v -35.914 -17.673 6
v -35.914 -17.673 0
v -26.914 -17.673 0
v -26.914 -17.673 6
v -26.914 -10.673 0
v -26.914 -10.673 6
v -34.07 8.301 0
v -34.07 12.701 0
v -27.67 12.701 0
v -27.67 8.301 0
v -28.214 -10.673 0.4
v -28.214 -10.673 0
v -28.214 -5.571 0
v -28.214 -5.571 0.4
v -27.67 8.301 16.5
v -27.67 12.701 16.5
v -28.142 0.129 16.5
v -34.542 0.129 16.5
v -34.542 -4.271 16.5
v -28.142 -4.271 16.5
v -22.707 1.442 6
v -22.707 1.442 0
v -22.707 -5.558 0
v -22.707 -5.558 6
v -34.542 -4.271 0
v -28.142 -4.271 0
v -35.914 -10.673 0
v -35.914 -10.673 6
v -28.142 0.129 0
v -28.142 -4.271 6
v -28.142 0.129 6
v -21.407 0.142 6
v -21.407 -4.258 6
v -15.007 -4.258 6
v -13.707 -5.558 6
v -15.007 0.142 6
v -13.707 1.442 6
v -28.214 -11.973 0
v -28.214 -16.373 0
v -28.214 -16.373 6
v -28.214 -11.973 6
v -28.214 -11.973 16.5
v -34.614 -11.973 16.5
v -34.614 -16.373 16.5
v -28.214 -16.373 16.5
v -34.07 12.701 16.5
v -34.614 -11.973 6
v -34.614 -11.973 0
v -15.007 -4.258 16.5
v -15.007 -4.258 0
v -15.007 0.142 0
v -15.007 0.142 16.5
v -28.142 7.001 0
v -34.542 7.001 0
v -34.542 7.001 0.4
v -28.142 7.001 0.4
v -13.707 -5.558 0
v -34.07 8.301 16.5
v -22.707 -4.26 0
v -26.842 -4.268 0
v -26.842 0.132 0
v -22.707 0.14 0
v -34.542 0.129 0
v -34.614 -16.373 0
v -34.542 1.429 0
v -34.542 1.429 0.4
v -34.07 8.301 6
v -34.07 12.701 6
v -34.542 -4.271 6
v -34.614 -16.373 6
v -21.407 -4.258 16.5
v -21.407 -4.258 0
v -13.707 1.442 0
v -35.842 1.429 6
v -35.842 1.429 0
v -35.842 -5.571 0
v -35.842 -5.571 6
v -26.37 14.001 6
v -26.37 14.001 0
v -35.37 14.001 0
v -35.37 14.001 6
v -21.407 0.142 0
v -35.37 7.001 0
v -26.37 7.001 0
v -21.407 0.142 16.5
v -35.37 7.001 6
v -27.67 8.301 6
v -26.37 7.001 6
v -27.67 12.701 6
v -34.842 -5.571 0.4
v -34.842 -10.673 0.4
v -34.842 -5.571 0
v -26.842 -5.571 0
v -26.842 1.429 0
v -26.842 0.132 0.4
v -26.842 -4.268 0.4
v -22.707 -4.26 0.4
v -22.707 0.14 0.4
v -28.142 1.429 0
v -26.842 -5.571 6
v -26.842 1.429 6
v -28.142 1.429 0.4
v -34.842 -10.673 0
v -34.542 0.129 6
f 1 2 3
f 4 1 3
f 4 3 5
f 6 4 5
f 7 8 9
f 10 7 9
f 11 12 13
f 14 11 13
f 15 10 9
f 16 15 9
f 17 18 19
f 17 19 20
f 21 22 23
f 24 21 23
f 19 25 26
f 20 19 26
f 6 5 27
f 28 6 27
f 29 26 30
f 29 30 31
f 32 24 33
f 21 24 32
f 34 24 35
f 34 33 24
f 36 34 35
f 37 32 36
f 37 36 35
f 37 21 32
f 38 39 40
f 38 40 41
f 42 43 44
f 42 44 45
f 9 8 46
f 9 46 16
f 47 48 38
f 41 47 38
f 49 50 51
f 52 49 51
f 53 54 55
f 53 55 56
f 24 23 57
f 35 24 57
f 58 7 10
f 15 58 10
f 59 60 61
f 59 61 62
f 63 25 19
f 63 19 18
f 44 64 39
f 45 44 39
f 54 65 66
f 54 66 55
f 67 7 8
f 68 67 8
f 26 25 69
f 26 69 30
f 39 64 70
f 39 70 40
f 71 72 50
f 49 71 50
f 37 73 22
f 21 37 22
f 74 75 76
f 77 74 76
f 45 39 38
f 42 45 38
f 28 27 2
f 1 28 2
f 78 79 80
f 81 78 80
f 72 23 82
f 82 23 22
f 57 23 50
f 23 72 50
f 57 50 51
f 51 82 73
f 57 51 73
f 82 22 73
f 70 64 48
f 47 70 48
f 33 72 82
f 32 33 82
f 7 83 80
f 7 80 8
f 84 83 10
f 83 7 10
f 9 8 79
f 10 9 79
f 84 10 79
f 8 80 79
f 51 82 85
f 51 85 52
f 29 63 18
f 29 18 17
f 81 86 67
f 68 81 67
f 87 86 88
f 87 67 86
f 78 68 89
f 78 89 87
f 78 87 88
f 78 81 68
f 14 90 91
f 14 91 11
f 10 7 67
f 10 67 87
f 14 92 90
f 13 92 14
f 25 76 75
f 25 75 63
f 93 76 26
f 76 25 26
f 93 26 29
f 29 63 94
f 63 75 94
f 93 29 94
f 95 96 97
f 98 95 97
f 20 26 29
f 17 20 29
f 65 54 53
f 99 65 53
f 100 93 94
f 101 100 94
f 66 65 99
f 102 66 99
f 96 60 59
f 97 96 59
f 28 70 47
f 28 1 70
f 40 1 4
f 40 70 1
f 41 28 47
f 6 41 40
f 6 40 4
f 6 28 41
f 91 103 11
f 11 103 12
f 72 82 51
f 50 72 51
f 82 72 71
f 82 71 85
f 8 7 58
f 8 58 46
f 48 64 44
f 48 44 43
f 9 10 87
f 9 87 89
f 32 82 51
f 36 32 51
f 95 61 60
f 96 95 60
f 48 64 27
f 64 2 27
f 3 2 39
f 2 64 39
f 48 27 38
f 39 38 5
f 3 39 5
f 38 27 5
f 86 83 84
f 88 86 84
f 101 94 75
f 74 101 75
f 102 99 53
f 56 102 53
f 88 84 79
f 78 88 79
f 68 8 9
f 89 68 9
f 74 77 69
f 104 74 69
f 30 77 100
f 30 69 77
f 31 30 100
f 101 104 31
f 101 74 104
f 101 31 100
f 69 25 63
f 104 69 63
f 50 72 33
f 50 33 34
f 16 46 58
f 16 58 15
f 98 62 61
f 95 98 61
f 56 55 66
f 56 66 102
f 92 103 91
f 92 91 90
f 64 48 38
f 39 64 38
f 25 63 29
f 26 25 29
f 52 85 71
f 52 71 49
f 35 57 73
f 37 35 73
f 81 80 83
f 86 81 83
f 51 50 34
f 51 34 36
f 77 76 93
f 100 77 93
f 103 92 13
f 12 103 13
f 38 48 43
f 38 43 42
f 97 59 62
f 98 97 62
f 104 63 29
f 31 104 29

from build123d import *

# Parameters (mm, degrees)
F0_W     = 6.4
F0_H     = 4.4
F1_DEPTH = 6
F2_DEPTH = 16.5
F0_H_2   = 5.571128
F0_W_2   = 6.627438
F0_H_3   = 5.102501
F3_DEPTH = 0.4


with BuildPart() as f1:
    # F0 (on Top) → F1 (new body)
    with BuildSketch(Plane.XY):
        Polygon((-28.141729, 1.429472), (-34.541729, 1.429472), (-35.841729, 1.429472), (-35.841729, -5.570528), (-34.841729, -5.570528), (-28.214291, -5.570528), (-26.841729, -5.570528), (-26.841729, -4.26808), (-26.841729, 0.13192), (-26.841729, 1.429472), align=None)
        with Locations((-31.341729, -2.070528)):
            Rectangle(F0_W, F0_H, mode=Mode.SUBTRACT)
        Polygon((-22.707351, 1.442154), (-22.707351, 0.139706), (-22.707351, -4.260294), (-22.707351, -5.557846), (-13.707351, -5.557846), (-13.707351, 1.442154), align=None)
        with Locations((-18.207351, -2.057846)):
            Rectangle(F0_W, F0_H, mode=Mode.SUBTRACT)
        Polygon((-26.370052, 14.0006), (-35.370052, 14.0006), (-35.370052, 7.0006), (-34.541729, 7.0006), (-28.141729, 7.0006), (-26.370052, 7.0006), align=None)
        with Locations((-30.870052, 10.5006)):
            Rectangle(F0_W, F0_H, mode=Mode.SUBTRACT)
        Polygon((-28.214291, -10.673029), (-34.841729, -10.673029), (-35.914291, -10.673029), (-35.914291, -17.673029), (-26.914291, -17.673029), (-26.914291, -10.673029), align=None)
        with Locations((-31.414291, -14.173029)):
            Rectangle(F0_W, F0_H, mode=Mode.SUBTRACT)
    extrude(amount=F1_DEPTH)


with BuildPart() as f2:
    # F0 (on Top) → F2 (new body)
    with BuildSketch(Plane.XY):
        with Locations((-30.870052, 10.5006)):
            Rectangle(F0_W, F0_H)
        with Locations((-31.341729, -2.070528)):
            Rectangle(F0_W, F0_H)
        with Locations((-18.207351, -2.057846)):
            Rectangle(F0_W, F0_H)
        with Locations((-31.414291, -14.173029)):
            Rectangle(F0_W, F0_H)
    extrude(amount=F2_DEPTH)


with BuildPart() as f3:
    # F0 (on Top) → F3 (new body)
    with BuildSketch(Plane.XY):
        Polygon((-22.707351, 0.139706), (-26.841729, 0.13192), (-26.841729, -4.26808), (-22.707351, -4.260294), align=None)
        with Locations((-31.341729, 4.215036)):
            Rectangle(F0_W, F0_H_2)
        with Locations((-31.52801, -8.121778)):
            Rectangle(F0_W_2, F0_H_3)
    extrude(amount=F3_DEPTH)


solid = Compound([f1.part, f2.part, f3.part])
